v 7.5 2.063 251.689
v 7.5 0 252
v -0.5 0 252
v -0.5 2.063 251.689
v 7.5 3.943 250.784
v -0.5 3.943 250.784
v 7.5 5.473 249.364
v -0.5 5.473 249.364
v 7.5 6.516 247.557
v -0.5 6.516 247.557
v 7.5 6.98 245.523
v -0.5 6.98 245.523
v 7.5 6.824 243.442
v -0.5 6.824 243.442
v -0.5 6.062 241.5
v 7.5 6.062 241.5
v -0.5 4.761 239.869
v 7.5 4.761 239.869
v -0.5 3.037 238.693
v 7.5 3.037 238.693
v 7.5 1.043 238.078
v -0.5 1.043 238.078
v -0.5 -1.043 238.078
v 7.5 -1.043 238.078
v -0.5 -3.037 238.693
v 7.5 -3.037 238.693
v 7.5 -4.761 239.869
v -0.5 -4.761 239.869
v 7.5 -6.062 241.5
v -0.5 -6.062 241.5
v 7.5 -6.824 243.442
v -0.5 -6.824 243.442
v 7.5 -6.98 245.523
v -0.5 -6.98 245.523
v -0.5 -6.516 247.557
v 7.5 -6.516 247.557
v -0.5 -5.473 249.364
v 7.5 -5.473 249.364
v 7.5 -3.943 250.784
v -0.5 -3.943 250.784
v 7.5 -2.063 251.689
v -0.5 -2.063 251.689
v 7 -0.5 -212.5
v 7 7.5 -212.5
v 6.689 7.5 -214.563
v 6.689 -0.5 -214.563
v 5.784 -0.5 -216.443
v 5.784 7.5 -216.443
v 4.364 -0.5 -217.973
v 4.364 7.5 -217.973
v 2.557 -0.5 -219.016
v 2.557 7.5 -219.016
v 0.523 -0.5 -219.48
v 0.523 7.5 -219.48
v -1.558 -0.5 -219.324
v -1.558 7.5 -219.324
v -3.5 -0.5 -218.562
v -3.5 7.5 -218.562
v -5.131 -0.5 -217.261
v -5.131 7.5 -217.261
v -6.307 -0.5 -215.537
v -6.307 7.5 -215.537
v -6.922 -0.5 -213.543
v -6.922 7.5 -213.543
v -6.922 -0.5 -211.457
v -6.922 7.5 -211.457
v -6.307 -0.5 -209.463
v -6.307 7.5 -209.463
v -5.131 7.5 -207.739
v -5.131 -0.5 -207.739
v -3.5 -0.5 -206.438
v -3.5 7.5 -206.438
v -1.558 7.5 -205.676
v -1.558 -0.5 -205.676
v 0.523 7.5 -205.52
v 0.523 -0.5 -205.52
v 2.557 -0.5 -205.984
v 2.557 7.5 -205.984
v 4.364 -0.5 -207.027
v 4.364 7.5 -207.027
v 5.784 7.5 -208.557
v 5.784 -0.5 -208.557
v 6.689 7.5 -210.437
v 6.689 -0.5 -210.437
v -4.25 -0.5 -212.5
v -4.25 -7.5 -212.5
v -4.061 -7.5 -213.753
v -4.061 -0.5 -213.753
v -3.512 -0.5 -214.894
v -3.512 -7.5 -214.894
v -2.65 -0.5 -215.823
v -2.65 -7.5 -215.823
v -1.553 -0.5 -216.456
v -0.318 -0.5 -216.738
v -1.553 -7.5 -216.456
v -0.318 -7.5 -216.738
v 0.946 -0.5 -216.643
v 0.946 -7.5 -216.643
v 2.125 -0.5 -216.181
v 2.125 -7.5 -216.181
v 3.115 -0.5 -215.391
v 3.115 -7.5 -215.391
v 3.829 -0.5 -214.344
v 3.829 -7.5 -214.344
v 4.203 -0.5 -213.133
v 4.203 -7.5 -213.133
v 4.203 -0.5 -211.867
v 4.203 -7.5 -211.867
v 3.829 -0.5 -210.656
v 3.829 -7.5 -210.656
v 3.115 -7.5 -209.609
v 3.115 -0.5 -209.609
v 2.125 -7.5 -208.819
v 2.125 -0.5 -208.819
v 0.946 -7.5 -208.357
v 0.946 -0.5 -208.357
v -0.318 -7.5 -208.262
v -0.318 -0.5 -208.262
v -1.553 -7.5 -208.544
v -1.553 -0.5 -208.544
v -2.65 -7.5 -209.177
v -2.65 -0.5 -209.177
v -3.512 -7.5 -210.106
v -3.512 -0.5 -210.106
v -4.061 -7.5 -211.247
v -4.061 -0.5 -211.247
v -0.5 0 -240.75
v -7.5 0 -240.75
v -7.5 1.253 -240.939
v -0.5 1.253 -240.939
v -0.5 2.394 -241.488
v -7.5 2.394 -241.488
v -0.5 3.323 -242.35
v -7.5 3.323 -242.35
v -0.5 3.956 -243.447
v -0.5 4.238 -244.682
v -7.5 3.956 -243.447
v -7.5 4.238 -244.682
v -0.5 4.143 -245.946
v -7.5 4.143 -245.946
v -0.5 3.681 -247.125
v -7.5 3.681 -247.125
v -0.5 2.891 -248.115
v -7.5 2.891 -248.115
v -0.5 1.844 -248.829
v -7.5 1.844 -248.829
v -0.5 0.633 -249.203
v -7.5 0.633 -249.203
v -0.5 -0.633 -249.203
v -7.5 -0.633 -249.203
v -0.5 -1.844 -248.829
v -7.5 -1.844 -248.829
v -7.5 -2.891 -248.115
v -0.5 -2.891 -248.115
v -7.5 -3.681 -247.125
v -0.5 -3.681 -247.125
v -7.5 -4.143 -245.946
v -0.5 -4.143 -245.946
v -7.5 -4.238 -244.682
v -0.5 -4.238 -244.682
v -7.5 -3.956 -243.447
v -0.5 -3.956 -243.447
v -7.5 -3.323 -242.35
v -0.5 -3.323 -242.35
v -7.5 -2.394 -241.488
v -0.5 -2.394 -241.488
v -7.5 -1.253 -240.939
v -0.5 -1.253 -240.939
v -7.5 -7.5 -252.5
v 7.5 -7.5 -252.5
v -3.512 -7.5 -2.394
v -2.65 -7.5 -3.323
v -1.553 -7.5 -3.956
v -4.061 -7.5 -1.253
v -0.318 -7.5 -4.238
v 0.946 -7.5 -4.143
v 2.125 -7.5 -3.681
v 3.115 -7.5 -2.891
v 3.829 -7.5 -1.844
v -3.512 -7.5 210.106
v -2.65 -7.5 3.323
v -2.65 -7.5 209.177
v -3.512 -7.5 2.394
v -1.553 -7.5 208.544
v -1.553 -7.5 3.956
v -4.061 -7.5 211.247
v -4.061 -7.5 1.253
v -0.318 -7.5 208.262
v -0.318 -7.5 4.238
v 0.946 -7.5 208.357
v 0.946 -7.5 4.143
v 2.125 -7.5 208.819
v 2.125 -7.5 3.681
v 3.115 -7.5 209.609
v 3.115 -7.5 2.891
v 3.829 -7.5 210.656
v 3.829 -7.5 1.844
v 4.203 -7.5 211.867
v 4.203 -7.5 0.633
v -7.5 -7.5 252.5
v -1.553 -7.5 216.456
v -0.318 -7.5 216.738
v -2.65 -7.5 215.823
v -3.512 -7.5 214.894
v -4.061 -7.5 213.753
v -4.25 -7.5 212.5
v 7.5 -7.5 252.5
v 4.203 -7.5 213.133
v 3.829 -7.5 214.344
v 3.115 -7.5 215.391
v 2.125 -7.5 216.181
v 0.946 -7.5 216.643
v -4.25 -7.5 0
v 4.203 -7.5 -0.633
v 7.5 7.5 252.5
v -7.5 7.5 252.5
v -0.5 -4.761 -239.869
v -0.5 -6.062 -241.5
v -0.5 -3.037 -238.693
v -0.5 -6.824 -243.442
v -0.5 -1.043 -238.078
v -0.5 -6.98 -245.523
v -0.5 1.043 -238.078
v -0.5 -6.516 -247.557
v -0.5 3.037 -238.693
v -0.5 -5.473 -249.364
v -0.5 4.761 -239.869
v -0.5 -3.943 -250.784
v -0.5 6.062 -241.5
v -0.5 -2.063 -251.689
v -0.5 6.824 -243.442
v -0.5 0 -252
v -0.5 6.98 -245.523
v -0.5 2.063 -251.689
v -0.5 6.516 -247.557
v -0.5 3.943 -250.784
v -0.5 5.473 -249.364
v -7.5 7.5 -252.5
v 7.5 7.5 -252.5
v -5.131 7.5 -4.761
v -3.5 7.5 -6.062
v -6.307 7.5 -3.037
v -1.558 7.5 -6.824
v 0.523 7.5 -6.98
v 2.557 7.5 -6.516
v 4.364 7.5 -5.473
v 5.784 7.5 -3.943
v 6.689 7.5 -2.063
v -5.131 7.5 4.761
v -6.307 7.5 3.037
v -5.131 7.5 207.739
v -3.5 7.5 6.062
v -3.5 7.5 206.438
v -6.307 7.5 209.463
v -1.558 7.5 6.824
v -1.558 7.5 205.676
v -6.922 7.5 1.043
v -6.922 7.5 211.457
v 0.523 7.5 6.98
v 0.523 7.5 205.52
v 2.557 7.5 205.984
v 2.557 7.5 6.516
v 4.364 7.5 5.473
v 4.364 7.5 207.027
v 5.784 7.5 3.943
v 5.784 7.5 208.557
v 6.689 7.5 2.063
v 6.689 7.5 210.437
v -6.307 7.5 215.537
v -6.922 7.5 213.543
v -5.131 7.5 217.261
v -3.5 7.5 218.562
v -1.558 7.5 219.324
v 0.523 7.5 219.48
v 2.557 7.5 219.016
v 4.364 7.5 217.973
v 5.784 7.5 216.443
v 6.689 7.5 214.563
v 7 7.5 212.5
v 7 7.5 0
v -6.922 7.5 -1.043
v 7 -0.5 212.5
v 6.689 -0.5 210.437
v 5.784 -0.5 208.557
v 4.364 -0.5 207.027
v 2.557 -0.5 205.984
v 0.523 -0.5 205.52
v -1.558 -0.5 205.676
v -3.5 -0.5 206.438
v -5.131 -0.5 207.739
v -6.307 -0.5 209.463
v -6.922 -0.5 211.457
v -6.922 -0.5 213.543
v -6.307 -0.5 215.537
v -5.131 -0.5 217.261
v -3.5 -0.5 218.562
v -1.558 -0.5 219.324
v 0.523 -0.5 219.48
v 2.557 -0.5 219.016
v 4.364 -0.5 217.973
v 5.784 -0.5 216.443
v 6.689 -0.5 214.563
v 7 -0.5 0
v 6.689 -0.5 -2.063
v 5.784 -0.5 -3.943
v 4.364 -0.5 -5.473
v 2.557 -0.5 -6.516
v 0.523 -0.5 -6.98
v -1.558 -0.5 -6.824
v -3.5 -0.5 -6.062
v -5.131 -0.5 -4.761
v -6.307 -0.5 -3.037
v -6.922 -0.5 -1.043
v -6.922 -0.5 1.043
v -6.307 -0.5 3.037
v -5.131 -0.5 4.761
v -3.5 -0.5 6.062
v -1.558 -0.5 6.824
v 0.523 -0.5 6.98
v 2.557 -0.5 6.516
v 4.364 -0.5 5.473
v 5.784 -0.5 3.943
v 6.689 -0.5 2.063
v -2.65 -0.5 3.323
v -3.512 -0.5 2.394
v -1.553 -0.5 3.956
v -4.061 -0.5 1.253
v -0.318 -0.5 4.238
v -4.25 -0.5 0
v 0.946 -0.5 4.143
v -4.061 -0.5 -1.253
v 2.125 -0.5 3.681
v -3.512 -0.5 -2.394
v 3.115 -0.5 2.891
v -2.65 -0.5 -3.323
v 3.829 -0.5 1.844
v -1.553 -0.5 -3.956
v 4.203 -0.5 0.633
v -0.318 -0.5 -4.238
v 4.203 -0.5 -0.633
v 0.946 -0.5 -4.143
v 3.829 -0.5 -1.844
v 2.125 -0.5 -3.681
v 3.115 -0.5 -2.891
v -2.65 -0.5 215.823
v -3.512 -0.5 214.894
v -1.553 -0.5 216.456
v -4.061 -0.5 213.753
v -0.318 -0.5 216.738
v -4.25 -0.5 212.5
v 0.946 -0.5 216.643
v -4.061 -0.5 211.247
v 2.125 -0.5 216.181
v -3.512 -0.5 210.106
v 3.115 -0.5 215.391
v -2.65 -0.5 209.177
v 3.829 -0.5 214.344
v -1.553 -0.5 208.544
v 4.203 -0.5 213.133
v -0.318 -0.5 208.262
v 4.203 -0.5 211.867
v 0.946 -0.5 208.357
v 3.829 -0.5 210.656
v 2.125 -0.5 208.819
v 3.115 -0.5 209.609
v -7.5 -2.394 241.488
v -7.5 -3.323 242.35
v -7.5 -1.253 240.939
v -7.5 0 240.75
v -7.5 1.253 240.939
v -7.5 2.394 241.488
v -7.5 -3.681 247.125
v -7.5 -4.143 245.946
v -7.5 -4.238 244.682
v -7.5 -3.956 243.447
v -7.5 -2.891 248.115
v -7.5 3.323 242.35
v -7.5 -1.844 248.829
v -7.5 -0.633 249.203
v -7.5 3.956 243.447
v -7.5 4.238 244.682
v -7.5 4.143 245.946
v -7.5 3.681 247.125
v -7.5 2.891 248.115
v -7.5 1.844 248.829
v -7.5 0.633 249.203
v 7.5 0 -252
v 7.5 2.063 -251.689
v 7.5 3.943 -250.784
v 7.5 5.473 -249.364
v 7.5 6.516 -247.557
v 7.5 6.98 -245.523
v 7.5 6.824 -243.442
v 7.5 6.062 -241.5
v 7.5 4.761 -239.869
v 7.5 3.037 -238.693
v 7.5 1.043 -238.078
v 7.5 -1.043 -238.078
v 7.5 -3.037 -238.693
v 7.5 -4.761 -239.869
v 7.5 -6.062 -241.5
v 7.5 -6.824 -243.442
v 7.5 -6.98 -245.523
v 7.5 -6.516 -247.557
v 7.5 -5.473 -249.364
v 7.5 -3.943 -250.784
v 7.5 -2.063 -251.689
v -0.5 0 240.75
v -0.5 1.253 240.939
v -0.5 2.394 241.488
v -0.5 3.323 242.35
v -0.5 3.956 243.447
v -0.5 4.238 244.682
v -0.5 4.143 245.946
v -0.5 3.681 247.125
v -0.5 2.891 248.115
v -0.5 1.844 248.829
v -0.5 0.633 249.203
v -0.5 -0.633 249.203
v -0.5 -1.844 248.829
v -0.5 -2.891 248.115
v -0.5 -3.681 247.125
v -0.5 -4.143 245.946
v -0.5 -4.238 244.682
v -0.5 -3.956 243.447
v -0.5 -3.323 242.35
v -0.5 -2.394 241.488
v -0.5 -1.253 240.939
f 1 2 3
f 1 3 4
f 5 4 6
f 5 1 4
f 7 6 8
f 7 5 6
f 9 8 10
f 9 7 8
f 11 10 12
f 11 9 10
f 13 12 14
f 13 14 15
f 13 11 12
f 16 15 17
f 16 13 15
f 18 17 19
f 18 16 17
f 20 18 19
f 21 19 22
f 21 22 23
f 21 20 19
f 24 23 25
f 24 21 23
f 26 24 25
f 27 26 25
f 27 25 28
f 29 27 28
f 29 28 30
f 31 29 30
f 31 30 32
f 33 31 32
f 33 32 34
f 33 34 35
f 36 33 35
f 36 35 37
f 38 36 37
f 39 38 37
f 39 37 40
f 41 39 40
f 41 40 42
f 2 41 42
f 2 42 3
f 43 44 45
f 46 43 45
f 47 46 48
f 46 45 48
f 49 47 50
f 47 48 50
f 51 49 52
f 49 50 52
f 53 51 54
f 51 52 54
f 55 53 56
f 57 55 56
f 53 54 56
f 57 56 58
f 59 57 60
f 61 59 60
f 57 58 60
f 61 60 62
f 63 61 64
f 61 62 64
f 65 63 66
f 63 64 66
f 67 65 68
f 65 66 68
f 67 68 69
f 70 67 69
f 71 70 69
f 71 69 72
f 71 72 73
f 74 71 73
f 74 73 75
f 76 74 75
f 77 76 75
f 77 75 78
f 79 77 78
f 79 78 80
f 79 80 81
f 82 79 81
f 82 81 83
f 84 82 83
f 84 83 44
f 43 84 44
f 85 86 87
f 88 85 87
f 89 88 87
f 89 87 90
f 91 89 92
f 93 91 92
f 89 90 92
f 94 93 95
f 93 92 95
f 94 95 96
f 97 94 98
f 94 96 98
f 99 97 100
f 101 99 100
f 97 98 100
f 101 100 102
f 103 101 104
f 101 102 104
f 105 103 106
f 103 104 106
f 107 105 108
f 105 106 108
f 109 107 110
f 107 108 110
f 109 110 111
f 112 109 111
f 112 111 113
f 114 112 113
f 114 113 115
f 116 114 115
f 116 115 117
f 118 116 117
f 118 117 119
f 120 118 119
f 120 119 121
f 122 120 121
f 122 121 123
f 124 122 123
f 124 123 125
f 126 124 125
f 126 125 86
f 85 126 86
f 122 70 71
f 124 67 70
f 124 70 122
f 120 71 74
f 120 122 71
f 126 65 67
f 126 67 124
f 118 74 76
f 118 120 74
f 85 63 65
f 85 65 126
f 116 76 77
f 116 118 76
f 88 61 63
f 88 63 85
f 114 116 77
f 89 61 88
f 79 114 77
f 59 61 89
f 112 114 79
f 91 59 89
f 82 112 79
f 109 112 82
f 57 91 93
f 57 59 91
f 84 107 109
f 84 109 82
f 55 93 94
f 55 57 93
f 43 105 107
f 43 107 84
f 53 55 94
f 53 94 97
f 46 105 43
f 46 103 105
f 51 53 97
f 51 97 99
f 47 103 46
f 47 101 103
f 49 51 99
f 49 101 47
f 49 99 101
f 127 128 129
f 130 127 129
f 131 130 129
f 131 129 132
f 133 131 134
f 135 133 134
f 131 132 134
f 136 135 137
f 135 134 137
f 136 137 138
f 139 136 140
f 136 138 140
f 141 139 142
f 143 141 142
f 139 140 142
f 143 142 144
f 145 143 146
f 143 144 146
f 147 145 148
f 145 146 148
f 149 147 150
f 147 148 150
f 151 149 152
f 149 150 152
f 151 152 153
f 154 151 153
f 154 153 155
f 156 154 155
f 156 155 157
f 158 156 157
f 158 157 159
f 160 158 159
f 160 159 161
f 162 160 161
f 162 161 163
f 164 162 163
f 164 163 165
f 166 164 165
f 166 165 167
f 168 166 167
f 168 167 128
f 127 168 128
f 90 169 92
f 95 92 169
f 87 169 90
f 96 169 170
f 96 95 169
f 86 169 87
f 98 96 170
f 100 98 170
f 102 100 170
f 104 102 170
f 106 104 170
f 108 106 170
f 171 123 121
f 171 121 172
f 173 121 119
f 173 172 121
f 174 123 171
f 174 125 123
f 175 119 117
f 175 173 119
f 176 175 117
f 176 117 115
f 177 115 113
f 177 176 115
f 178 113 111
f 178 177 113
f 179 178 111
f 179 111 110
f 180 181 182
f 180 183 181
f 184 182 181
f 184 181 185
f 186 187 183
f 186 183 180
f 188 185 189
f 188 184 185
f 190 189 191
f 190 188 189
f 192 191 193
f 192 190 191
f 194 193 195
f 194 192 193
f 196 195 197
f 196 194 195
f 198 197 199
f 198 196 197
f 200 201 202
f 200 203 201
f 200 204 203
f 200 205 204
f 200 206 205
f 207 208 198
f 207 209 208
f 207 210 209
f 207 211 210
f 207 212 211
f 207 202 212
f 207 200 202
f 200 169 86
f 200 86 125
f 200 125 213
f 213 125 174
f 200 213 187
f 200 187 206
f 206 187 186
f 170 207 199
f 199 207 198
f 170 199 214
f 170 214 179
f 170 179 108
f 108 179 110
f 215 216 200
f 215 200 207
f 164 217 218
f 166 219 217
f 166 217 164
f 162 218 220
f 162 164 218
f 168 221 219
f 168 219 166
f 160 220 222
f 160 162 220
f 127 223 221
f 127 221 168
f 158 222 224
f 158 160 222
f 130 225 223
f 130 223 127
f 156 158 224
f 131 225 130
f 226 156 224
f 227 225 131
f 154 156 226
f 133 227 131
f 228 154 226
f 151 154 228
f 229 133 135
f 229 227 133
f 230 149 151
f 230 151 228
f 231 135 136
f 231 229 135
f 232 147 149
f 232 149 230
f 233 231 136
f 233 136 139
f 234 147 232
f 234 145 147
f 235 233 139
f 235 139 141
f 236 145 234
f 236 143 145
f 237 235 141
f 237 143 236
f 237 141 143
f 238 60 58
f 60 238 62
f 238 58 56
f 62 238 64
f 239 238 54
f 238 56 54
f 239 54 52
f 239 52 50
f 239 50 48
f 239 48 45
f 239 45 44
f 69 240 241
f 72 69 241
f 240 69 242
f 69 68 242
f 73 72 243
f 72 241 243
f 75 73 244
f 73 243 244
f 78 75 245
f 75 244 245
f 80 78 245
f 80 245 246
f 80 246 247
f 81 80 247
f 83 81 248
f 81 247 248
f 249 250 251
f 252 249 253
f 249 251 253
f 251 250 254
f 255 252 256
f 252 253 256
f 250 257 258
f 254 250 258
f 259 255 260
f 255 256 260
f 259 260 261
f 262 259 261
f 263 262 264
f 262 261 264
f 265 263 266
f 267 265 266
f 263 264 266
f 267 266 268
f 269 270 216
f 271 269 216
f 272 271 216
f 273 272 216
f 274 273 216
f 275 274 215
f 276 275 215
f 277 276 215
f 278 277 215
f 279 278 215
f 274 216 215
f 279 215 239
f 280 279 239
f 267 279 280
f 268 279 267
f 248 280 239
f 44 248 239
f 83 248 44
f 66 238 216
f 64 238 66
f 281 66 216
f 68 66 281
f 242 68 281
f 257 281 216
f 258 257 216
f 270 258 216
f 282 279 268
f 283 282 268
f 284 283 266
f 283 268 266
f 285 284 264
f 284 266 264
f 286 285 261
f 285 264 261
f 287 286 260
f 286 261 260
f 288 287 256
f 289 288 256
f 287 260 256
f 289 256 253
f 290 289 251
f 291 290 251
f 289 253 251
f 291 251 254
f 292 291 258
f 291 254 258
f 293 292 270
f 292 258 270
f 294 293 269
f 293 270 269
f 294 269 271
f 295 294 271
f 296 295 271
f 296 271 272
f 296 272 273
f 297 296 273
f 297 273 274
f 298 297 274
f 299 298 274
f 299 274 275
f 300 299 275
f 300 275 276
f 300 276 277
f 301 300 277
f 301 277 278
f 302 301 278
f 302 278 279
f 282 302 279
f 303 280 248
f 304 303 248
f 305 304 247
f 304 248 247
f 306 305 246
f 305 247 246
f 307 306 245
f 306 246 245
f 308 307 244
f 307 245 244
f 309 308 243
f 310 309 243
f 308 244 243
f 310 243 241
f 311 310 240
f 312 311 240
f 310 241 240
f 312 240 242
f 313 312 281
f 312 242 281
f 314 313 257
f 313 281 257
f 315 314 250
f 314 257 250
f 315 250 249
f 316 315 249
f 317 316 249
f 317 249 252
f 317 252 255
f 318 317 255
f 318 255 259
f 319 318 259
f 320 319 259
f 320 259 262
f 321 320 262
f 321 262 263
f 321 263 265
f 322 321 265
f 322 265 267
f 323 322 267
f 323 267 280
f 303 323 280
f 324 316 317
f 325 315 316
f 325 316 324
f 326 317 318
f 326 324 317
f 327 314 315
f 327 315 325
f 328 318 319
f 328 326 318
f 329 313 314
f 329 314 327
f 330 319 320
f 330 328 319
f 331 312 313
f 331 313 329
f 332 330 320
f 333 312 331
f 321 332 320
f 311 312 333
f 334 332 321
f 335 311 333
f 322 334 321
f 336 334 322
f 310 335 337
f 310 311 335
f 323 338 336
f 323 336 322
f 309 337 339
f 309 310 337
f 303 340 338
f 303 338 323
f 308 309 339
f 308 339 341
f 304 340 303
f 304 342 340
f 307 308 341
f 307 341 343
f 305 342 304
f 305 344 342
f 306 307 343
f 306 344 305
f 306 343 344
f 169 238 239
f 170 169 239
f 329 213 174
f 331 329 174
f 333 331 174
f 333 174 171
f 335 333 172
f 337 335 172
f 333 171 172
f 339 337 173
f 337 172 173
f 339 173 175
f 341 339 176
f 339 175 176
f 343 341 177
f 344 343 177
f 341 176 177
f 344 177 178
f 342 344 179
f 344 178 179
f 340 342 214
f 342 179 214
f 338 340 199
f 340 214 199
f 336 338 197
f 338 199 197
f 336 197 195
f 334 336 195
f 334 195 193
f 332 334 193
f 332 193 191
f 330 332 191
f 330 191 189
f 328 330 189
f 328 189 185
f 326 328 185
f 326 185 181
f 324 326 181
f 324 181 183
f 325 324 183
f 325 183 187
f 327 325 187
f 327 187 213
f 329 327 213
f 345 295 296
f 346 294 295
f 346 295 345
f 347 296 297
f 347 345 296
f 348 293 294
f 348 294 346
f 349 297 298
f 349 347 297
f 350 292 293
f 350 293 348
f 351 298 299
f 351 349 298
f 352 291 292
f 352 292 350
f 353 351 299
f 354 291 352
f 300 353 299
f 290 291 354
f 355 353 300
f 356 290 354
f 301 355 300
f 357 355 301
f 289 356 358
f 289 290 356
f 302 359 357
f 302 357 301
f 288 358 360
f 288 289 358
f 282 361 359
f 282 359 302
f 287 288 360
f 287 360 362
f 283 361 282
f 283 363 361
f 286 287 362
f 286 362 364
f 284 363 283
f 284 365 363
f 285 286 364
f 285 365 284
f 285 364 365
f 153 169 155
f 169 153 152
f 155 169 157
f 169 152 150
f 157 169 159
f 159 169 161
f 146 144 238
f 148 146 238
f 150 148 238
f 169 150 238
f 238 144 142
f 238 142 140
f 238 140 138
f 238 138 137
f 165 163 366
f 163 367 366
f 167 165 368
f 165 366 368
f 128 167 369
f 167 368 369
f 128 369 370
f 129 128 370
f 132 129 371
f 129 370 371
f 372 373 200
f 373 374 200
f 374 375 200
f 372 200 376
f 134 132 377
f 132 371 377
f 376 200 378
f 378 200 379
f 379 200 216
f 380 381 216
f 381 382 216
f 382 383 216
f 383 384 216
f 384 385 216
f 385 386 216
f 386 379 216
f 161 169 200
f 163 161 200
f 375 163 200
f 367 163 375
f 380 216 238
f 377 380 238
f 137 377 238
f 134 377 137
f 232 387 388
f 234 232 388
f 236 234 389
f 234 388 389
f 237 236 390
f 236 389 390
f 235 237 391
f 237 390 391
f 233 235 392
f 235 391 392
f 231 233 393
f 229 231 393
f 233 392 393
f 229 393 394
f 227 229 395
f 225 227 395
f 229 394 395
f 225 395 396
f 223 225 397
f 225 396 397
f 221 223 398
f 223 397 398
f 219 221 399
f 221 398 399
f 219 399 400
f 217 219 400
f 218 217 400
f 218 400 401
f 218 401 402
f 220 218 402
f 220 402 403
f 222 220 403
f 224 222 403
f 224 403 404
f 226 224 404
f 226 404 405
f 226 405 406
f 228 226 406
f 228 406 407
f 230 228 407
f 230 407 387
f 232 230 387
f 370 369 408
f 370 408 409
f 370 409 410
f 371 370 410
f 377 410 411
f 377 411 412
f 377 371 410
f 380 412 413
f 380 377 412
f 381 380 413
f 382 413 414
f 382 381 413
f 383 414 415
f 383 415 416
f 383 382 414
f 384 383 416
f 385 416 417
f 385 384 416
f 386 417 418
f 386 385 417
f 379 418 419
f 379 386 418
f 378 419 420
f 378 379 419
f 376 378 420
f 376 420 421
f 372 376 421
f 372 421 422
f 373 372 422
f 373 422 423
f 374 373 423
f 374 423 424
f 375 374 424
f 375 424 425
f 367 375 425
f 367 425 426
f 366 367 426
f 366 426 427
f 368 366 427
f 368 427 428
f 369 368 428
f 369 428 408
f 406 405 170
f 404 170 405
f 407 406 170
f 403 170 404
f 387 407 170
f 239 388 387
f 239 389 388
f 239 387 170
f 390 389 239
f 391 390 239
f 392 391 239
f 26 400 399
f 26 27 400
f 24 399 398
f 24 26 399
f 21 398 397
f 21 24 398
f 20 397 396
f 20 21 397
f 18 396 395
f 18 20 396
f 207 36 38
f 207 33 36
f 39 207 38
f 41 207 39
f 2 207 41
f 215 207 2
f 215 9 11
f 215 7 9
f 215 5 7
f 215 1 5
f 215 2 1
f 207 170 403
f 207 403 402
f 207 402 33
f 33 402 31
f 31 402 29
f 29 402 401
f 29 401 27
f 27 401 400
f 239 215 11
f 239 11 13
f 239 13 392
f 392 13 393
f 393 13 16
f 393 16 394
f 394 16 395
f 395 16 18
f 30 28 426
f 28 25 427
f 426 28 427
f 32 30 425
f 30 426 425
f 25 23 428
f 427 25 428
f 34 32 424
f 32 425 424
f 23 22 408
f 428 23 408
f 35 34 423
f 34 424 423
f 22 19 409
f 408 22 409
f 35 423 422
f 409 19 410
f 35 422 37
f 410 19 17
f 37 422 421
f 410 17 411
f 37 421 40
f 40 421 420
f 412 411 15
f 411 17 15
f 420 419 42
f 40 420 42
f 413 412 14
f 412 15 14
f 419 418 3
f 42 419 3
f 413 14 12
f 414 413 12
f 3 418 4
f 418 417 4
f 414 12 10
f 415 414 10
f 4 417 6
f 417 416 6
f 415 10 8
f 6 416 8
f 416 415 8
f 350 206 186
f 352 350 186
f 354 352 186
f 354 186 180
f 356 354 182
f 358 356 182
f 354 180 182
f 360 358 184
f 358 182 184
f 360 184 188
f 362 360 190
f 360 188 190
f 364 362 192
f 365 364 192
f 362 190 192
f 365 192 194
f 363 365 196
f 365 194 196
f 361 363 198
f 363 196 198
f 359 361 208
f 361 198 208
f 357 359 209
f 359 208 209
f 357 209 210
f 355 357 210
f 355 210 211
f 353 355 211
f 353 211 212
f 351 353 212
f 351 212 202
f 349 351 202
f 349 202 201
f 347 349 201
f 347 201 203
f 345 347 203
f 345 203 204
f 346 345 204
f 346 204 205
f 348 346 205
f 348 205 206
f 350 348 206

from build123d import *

# Parameters (mm, degrees)
IZIM1_W                     = 15
IZIM1_H                     = 15
Y_KSEKLIK_EKSTR_ZYON1_DEPTH = 252.5
DELIK2_D                    = 8.5
DELIK2_DEPTH                = 15
DELIK2_CBORE_D              = 14
DELIK2_CBORE_DEPTH          = 8
DELIK3_D                    = 8.5
DELIK3_DEPTH                = 15
DELIK3_CBORE_D              = 14
DELIK3_CBORE_DEPTH          = 8
L_O_ALTMA1_COUNT            = 3
L_O_ALTMA1_PITCH            = 212.5


with BuildPart() as part:
    # Çizim1 → Yükseklik-Ekstrüzyon1 (new body, symmetric)
    with BuildSketch(Plane.XY):
        Rectangle(IZIM1_W, IZIM1_H)
    extrude(amount=Y_KSEKLIK_EKSTR_ZYON1_DEPTH, both=True)

    # Delik2
    with Locations(Plane(origin=(7.5, 0, 0), x_dir=(0, 0, -1), z_dir=(1, 0, 0))):
        with Locations((245, 0)):
            delik2 = CounterBoreHole(DELIK2_D / 2, DELIK2_CBORE_D / 2, DELIK2_CBORE_DEPTH, depth=DELIK2_DEPTH)

    # Aynalama1: Delik2 across plane
    add(delik2.mirror(Plane.XY), mode=Mode.SUBTRACT)

    # Delik3
    with Locations(Plane(origin=(0, 7.5, 0), x_dir=(1, 0, 0), z_dir=(0, 1, 0))):
        with Locations((0, -212.5)):
            delik3 = CounterBoreHole(DELIK3_D / 2, DELIK3_CBORE_D / 2, DELIK3_CBORE_DEPTH, depth=DELIK3_DEPTH)

    # LÇoğaltma1: Delik3 ×3
    with Locations(*[(0, 0, -i * L_O_ALTMA1_PITCH) for i in range(1, L_O_ALTMA1_COUNT)]):
        add(delik3, mode=Mode.SUBTRACT)


solid = part.part
